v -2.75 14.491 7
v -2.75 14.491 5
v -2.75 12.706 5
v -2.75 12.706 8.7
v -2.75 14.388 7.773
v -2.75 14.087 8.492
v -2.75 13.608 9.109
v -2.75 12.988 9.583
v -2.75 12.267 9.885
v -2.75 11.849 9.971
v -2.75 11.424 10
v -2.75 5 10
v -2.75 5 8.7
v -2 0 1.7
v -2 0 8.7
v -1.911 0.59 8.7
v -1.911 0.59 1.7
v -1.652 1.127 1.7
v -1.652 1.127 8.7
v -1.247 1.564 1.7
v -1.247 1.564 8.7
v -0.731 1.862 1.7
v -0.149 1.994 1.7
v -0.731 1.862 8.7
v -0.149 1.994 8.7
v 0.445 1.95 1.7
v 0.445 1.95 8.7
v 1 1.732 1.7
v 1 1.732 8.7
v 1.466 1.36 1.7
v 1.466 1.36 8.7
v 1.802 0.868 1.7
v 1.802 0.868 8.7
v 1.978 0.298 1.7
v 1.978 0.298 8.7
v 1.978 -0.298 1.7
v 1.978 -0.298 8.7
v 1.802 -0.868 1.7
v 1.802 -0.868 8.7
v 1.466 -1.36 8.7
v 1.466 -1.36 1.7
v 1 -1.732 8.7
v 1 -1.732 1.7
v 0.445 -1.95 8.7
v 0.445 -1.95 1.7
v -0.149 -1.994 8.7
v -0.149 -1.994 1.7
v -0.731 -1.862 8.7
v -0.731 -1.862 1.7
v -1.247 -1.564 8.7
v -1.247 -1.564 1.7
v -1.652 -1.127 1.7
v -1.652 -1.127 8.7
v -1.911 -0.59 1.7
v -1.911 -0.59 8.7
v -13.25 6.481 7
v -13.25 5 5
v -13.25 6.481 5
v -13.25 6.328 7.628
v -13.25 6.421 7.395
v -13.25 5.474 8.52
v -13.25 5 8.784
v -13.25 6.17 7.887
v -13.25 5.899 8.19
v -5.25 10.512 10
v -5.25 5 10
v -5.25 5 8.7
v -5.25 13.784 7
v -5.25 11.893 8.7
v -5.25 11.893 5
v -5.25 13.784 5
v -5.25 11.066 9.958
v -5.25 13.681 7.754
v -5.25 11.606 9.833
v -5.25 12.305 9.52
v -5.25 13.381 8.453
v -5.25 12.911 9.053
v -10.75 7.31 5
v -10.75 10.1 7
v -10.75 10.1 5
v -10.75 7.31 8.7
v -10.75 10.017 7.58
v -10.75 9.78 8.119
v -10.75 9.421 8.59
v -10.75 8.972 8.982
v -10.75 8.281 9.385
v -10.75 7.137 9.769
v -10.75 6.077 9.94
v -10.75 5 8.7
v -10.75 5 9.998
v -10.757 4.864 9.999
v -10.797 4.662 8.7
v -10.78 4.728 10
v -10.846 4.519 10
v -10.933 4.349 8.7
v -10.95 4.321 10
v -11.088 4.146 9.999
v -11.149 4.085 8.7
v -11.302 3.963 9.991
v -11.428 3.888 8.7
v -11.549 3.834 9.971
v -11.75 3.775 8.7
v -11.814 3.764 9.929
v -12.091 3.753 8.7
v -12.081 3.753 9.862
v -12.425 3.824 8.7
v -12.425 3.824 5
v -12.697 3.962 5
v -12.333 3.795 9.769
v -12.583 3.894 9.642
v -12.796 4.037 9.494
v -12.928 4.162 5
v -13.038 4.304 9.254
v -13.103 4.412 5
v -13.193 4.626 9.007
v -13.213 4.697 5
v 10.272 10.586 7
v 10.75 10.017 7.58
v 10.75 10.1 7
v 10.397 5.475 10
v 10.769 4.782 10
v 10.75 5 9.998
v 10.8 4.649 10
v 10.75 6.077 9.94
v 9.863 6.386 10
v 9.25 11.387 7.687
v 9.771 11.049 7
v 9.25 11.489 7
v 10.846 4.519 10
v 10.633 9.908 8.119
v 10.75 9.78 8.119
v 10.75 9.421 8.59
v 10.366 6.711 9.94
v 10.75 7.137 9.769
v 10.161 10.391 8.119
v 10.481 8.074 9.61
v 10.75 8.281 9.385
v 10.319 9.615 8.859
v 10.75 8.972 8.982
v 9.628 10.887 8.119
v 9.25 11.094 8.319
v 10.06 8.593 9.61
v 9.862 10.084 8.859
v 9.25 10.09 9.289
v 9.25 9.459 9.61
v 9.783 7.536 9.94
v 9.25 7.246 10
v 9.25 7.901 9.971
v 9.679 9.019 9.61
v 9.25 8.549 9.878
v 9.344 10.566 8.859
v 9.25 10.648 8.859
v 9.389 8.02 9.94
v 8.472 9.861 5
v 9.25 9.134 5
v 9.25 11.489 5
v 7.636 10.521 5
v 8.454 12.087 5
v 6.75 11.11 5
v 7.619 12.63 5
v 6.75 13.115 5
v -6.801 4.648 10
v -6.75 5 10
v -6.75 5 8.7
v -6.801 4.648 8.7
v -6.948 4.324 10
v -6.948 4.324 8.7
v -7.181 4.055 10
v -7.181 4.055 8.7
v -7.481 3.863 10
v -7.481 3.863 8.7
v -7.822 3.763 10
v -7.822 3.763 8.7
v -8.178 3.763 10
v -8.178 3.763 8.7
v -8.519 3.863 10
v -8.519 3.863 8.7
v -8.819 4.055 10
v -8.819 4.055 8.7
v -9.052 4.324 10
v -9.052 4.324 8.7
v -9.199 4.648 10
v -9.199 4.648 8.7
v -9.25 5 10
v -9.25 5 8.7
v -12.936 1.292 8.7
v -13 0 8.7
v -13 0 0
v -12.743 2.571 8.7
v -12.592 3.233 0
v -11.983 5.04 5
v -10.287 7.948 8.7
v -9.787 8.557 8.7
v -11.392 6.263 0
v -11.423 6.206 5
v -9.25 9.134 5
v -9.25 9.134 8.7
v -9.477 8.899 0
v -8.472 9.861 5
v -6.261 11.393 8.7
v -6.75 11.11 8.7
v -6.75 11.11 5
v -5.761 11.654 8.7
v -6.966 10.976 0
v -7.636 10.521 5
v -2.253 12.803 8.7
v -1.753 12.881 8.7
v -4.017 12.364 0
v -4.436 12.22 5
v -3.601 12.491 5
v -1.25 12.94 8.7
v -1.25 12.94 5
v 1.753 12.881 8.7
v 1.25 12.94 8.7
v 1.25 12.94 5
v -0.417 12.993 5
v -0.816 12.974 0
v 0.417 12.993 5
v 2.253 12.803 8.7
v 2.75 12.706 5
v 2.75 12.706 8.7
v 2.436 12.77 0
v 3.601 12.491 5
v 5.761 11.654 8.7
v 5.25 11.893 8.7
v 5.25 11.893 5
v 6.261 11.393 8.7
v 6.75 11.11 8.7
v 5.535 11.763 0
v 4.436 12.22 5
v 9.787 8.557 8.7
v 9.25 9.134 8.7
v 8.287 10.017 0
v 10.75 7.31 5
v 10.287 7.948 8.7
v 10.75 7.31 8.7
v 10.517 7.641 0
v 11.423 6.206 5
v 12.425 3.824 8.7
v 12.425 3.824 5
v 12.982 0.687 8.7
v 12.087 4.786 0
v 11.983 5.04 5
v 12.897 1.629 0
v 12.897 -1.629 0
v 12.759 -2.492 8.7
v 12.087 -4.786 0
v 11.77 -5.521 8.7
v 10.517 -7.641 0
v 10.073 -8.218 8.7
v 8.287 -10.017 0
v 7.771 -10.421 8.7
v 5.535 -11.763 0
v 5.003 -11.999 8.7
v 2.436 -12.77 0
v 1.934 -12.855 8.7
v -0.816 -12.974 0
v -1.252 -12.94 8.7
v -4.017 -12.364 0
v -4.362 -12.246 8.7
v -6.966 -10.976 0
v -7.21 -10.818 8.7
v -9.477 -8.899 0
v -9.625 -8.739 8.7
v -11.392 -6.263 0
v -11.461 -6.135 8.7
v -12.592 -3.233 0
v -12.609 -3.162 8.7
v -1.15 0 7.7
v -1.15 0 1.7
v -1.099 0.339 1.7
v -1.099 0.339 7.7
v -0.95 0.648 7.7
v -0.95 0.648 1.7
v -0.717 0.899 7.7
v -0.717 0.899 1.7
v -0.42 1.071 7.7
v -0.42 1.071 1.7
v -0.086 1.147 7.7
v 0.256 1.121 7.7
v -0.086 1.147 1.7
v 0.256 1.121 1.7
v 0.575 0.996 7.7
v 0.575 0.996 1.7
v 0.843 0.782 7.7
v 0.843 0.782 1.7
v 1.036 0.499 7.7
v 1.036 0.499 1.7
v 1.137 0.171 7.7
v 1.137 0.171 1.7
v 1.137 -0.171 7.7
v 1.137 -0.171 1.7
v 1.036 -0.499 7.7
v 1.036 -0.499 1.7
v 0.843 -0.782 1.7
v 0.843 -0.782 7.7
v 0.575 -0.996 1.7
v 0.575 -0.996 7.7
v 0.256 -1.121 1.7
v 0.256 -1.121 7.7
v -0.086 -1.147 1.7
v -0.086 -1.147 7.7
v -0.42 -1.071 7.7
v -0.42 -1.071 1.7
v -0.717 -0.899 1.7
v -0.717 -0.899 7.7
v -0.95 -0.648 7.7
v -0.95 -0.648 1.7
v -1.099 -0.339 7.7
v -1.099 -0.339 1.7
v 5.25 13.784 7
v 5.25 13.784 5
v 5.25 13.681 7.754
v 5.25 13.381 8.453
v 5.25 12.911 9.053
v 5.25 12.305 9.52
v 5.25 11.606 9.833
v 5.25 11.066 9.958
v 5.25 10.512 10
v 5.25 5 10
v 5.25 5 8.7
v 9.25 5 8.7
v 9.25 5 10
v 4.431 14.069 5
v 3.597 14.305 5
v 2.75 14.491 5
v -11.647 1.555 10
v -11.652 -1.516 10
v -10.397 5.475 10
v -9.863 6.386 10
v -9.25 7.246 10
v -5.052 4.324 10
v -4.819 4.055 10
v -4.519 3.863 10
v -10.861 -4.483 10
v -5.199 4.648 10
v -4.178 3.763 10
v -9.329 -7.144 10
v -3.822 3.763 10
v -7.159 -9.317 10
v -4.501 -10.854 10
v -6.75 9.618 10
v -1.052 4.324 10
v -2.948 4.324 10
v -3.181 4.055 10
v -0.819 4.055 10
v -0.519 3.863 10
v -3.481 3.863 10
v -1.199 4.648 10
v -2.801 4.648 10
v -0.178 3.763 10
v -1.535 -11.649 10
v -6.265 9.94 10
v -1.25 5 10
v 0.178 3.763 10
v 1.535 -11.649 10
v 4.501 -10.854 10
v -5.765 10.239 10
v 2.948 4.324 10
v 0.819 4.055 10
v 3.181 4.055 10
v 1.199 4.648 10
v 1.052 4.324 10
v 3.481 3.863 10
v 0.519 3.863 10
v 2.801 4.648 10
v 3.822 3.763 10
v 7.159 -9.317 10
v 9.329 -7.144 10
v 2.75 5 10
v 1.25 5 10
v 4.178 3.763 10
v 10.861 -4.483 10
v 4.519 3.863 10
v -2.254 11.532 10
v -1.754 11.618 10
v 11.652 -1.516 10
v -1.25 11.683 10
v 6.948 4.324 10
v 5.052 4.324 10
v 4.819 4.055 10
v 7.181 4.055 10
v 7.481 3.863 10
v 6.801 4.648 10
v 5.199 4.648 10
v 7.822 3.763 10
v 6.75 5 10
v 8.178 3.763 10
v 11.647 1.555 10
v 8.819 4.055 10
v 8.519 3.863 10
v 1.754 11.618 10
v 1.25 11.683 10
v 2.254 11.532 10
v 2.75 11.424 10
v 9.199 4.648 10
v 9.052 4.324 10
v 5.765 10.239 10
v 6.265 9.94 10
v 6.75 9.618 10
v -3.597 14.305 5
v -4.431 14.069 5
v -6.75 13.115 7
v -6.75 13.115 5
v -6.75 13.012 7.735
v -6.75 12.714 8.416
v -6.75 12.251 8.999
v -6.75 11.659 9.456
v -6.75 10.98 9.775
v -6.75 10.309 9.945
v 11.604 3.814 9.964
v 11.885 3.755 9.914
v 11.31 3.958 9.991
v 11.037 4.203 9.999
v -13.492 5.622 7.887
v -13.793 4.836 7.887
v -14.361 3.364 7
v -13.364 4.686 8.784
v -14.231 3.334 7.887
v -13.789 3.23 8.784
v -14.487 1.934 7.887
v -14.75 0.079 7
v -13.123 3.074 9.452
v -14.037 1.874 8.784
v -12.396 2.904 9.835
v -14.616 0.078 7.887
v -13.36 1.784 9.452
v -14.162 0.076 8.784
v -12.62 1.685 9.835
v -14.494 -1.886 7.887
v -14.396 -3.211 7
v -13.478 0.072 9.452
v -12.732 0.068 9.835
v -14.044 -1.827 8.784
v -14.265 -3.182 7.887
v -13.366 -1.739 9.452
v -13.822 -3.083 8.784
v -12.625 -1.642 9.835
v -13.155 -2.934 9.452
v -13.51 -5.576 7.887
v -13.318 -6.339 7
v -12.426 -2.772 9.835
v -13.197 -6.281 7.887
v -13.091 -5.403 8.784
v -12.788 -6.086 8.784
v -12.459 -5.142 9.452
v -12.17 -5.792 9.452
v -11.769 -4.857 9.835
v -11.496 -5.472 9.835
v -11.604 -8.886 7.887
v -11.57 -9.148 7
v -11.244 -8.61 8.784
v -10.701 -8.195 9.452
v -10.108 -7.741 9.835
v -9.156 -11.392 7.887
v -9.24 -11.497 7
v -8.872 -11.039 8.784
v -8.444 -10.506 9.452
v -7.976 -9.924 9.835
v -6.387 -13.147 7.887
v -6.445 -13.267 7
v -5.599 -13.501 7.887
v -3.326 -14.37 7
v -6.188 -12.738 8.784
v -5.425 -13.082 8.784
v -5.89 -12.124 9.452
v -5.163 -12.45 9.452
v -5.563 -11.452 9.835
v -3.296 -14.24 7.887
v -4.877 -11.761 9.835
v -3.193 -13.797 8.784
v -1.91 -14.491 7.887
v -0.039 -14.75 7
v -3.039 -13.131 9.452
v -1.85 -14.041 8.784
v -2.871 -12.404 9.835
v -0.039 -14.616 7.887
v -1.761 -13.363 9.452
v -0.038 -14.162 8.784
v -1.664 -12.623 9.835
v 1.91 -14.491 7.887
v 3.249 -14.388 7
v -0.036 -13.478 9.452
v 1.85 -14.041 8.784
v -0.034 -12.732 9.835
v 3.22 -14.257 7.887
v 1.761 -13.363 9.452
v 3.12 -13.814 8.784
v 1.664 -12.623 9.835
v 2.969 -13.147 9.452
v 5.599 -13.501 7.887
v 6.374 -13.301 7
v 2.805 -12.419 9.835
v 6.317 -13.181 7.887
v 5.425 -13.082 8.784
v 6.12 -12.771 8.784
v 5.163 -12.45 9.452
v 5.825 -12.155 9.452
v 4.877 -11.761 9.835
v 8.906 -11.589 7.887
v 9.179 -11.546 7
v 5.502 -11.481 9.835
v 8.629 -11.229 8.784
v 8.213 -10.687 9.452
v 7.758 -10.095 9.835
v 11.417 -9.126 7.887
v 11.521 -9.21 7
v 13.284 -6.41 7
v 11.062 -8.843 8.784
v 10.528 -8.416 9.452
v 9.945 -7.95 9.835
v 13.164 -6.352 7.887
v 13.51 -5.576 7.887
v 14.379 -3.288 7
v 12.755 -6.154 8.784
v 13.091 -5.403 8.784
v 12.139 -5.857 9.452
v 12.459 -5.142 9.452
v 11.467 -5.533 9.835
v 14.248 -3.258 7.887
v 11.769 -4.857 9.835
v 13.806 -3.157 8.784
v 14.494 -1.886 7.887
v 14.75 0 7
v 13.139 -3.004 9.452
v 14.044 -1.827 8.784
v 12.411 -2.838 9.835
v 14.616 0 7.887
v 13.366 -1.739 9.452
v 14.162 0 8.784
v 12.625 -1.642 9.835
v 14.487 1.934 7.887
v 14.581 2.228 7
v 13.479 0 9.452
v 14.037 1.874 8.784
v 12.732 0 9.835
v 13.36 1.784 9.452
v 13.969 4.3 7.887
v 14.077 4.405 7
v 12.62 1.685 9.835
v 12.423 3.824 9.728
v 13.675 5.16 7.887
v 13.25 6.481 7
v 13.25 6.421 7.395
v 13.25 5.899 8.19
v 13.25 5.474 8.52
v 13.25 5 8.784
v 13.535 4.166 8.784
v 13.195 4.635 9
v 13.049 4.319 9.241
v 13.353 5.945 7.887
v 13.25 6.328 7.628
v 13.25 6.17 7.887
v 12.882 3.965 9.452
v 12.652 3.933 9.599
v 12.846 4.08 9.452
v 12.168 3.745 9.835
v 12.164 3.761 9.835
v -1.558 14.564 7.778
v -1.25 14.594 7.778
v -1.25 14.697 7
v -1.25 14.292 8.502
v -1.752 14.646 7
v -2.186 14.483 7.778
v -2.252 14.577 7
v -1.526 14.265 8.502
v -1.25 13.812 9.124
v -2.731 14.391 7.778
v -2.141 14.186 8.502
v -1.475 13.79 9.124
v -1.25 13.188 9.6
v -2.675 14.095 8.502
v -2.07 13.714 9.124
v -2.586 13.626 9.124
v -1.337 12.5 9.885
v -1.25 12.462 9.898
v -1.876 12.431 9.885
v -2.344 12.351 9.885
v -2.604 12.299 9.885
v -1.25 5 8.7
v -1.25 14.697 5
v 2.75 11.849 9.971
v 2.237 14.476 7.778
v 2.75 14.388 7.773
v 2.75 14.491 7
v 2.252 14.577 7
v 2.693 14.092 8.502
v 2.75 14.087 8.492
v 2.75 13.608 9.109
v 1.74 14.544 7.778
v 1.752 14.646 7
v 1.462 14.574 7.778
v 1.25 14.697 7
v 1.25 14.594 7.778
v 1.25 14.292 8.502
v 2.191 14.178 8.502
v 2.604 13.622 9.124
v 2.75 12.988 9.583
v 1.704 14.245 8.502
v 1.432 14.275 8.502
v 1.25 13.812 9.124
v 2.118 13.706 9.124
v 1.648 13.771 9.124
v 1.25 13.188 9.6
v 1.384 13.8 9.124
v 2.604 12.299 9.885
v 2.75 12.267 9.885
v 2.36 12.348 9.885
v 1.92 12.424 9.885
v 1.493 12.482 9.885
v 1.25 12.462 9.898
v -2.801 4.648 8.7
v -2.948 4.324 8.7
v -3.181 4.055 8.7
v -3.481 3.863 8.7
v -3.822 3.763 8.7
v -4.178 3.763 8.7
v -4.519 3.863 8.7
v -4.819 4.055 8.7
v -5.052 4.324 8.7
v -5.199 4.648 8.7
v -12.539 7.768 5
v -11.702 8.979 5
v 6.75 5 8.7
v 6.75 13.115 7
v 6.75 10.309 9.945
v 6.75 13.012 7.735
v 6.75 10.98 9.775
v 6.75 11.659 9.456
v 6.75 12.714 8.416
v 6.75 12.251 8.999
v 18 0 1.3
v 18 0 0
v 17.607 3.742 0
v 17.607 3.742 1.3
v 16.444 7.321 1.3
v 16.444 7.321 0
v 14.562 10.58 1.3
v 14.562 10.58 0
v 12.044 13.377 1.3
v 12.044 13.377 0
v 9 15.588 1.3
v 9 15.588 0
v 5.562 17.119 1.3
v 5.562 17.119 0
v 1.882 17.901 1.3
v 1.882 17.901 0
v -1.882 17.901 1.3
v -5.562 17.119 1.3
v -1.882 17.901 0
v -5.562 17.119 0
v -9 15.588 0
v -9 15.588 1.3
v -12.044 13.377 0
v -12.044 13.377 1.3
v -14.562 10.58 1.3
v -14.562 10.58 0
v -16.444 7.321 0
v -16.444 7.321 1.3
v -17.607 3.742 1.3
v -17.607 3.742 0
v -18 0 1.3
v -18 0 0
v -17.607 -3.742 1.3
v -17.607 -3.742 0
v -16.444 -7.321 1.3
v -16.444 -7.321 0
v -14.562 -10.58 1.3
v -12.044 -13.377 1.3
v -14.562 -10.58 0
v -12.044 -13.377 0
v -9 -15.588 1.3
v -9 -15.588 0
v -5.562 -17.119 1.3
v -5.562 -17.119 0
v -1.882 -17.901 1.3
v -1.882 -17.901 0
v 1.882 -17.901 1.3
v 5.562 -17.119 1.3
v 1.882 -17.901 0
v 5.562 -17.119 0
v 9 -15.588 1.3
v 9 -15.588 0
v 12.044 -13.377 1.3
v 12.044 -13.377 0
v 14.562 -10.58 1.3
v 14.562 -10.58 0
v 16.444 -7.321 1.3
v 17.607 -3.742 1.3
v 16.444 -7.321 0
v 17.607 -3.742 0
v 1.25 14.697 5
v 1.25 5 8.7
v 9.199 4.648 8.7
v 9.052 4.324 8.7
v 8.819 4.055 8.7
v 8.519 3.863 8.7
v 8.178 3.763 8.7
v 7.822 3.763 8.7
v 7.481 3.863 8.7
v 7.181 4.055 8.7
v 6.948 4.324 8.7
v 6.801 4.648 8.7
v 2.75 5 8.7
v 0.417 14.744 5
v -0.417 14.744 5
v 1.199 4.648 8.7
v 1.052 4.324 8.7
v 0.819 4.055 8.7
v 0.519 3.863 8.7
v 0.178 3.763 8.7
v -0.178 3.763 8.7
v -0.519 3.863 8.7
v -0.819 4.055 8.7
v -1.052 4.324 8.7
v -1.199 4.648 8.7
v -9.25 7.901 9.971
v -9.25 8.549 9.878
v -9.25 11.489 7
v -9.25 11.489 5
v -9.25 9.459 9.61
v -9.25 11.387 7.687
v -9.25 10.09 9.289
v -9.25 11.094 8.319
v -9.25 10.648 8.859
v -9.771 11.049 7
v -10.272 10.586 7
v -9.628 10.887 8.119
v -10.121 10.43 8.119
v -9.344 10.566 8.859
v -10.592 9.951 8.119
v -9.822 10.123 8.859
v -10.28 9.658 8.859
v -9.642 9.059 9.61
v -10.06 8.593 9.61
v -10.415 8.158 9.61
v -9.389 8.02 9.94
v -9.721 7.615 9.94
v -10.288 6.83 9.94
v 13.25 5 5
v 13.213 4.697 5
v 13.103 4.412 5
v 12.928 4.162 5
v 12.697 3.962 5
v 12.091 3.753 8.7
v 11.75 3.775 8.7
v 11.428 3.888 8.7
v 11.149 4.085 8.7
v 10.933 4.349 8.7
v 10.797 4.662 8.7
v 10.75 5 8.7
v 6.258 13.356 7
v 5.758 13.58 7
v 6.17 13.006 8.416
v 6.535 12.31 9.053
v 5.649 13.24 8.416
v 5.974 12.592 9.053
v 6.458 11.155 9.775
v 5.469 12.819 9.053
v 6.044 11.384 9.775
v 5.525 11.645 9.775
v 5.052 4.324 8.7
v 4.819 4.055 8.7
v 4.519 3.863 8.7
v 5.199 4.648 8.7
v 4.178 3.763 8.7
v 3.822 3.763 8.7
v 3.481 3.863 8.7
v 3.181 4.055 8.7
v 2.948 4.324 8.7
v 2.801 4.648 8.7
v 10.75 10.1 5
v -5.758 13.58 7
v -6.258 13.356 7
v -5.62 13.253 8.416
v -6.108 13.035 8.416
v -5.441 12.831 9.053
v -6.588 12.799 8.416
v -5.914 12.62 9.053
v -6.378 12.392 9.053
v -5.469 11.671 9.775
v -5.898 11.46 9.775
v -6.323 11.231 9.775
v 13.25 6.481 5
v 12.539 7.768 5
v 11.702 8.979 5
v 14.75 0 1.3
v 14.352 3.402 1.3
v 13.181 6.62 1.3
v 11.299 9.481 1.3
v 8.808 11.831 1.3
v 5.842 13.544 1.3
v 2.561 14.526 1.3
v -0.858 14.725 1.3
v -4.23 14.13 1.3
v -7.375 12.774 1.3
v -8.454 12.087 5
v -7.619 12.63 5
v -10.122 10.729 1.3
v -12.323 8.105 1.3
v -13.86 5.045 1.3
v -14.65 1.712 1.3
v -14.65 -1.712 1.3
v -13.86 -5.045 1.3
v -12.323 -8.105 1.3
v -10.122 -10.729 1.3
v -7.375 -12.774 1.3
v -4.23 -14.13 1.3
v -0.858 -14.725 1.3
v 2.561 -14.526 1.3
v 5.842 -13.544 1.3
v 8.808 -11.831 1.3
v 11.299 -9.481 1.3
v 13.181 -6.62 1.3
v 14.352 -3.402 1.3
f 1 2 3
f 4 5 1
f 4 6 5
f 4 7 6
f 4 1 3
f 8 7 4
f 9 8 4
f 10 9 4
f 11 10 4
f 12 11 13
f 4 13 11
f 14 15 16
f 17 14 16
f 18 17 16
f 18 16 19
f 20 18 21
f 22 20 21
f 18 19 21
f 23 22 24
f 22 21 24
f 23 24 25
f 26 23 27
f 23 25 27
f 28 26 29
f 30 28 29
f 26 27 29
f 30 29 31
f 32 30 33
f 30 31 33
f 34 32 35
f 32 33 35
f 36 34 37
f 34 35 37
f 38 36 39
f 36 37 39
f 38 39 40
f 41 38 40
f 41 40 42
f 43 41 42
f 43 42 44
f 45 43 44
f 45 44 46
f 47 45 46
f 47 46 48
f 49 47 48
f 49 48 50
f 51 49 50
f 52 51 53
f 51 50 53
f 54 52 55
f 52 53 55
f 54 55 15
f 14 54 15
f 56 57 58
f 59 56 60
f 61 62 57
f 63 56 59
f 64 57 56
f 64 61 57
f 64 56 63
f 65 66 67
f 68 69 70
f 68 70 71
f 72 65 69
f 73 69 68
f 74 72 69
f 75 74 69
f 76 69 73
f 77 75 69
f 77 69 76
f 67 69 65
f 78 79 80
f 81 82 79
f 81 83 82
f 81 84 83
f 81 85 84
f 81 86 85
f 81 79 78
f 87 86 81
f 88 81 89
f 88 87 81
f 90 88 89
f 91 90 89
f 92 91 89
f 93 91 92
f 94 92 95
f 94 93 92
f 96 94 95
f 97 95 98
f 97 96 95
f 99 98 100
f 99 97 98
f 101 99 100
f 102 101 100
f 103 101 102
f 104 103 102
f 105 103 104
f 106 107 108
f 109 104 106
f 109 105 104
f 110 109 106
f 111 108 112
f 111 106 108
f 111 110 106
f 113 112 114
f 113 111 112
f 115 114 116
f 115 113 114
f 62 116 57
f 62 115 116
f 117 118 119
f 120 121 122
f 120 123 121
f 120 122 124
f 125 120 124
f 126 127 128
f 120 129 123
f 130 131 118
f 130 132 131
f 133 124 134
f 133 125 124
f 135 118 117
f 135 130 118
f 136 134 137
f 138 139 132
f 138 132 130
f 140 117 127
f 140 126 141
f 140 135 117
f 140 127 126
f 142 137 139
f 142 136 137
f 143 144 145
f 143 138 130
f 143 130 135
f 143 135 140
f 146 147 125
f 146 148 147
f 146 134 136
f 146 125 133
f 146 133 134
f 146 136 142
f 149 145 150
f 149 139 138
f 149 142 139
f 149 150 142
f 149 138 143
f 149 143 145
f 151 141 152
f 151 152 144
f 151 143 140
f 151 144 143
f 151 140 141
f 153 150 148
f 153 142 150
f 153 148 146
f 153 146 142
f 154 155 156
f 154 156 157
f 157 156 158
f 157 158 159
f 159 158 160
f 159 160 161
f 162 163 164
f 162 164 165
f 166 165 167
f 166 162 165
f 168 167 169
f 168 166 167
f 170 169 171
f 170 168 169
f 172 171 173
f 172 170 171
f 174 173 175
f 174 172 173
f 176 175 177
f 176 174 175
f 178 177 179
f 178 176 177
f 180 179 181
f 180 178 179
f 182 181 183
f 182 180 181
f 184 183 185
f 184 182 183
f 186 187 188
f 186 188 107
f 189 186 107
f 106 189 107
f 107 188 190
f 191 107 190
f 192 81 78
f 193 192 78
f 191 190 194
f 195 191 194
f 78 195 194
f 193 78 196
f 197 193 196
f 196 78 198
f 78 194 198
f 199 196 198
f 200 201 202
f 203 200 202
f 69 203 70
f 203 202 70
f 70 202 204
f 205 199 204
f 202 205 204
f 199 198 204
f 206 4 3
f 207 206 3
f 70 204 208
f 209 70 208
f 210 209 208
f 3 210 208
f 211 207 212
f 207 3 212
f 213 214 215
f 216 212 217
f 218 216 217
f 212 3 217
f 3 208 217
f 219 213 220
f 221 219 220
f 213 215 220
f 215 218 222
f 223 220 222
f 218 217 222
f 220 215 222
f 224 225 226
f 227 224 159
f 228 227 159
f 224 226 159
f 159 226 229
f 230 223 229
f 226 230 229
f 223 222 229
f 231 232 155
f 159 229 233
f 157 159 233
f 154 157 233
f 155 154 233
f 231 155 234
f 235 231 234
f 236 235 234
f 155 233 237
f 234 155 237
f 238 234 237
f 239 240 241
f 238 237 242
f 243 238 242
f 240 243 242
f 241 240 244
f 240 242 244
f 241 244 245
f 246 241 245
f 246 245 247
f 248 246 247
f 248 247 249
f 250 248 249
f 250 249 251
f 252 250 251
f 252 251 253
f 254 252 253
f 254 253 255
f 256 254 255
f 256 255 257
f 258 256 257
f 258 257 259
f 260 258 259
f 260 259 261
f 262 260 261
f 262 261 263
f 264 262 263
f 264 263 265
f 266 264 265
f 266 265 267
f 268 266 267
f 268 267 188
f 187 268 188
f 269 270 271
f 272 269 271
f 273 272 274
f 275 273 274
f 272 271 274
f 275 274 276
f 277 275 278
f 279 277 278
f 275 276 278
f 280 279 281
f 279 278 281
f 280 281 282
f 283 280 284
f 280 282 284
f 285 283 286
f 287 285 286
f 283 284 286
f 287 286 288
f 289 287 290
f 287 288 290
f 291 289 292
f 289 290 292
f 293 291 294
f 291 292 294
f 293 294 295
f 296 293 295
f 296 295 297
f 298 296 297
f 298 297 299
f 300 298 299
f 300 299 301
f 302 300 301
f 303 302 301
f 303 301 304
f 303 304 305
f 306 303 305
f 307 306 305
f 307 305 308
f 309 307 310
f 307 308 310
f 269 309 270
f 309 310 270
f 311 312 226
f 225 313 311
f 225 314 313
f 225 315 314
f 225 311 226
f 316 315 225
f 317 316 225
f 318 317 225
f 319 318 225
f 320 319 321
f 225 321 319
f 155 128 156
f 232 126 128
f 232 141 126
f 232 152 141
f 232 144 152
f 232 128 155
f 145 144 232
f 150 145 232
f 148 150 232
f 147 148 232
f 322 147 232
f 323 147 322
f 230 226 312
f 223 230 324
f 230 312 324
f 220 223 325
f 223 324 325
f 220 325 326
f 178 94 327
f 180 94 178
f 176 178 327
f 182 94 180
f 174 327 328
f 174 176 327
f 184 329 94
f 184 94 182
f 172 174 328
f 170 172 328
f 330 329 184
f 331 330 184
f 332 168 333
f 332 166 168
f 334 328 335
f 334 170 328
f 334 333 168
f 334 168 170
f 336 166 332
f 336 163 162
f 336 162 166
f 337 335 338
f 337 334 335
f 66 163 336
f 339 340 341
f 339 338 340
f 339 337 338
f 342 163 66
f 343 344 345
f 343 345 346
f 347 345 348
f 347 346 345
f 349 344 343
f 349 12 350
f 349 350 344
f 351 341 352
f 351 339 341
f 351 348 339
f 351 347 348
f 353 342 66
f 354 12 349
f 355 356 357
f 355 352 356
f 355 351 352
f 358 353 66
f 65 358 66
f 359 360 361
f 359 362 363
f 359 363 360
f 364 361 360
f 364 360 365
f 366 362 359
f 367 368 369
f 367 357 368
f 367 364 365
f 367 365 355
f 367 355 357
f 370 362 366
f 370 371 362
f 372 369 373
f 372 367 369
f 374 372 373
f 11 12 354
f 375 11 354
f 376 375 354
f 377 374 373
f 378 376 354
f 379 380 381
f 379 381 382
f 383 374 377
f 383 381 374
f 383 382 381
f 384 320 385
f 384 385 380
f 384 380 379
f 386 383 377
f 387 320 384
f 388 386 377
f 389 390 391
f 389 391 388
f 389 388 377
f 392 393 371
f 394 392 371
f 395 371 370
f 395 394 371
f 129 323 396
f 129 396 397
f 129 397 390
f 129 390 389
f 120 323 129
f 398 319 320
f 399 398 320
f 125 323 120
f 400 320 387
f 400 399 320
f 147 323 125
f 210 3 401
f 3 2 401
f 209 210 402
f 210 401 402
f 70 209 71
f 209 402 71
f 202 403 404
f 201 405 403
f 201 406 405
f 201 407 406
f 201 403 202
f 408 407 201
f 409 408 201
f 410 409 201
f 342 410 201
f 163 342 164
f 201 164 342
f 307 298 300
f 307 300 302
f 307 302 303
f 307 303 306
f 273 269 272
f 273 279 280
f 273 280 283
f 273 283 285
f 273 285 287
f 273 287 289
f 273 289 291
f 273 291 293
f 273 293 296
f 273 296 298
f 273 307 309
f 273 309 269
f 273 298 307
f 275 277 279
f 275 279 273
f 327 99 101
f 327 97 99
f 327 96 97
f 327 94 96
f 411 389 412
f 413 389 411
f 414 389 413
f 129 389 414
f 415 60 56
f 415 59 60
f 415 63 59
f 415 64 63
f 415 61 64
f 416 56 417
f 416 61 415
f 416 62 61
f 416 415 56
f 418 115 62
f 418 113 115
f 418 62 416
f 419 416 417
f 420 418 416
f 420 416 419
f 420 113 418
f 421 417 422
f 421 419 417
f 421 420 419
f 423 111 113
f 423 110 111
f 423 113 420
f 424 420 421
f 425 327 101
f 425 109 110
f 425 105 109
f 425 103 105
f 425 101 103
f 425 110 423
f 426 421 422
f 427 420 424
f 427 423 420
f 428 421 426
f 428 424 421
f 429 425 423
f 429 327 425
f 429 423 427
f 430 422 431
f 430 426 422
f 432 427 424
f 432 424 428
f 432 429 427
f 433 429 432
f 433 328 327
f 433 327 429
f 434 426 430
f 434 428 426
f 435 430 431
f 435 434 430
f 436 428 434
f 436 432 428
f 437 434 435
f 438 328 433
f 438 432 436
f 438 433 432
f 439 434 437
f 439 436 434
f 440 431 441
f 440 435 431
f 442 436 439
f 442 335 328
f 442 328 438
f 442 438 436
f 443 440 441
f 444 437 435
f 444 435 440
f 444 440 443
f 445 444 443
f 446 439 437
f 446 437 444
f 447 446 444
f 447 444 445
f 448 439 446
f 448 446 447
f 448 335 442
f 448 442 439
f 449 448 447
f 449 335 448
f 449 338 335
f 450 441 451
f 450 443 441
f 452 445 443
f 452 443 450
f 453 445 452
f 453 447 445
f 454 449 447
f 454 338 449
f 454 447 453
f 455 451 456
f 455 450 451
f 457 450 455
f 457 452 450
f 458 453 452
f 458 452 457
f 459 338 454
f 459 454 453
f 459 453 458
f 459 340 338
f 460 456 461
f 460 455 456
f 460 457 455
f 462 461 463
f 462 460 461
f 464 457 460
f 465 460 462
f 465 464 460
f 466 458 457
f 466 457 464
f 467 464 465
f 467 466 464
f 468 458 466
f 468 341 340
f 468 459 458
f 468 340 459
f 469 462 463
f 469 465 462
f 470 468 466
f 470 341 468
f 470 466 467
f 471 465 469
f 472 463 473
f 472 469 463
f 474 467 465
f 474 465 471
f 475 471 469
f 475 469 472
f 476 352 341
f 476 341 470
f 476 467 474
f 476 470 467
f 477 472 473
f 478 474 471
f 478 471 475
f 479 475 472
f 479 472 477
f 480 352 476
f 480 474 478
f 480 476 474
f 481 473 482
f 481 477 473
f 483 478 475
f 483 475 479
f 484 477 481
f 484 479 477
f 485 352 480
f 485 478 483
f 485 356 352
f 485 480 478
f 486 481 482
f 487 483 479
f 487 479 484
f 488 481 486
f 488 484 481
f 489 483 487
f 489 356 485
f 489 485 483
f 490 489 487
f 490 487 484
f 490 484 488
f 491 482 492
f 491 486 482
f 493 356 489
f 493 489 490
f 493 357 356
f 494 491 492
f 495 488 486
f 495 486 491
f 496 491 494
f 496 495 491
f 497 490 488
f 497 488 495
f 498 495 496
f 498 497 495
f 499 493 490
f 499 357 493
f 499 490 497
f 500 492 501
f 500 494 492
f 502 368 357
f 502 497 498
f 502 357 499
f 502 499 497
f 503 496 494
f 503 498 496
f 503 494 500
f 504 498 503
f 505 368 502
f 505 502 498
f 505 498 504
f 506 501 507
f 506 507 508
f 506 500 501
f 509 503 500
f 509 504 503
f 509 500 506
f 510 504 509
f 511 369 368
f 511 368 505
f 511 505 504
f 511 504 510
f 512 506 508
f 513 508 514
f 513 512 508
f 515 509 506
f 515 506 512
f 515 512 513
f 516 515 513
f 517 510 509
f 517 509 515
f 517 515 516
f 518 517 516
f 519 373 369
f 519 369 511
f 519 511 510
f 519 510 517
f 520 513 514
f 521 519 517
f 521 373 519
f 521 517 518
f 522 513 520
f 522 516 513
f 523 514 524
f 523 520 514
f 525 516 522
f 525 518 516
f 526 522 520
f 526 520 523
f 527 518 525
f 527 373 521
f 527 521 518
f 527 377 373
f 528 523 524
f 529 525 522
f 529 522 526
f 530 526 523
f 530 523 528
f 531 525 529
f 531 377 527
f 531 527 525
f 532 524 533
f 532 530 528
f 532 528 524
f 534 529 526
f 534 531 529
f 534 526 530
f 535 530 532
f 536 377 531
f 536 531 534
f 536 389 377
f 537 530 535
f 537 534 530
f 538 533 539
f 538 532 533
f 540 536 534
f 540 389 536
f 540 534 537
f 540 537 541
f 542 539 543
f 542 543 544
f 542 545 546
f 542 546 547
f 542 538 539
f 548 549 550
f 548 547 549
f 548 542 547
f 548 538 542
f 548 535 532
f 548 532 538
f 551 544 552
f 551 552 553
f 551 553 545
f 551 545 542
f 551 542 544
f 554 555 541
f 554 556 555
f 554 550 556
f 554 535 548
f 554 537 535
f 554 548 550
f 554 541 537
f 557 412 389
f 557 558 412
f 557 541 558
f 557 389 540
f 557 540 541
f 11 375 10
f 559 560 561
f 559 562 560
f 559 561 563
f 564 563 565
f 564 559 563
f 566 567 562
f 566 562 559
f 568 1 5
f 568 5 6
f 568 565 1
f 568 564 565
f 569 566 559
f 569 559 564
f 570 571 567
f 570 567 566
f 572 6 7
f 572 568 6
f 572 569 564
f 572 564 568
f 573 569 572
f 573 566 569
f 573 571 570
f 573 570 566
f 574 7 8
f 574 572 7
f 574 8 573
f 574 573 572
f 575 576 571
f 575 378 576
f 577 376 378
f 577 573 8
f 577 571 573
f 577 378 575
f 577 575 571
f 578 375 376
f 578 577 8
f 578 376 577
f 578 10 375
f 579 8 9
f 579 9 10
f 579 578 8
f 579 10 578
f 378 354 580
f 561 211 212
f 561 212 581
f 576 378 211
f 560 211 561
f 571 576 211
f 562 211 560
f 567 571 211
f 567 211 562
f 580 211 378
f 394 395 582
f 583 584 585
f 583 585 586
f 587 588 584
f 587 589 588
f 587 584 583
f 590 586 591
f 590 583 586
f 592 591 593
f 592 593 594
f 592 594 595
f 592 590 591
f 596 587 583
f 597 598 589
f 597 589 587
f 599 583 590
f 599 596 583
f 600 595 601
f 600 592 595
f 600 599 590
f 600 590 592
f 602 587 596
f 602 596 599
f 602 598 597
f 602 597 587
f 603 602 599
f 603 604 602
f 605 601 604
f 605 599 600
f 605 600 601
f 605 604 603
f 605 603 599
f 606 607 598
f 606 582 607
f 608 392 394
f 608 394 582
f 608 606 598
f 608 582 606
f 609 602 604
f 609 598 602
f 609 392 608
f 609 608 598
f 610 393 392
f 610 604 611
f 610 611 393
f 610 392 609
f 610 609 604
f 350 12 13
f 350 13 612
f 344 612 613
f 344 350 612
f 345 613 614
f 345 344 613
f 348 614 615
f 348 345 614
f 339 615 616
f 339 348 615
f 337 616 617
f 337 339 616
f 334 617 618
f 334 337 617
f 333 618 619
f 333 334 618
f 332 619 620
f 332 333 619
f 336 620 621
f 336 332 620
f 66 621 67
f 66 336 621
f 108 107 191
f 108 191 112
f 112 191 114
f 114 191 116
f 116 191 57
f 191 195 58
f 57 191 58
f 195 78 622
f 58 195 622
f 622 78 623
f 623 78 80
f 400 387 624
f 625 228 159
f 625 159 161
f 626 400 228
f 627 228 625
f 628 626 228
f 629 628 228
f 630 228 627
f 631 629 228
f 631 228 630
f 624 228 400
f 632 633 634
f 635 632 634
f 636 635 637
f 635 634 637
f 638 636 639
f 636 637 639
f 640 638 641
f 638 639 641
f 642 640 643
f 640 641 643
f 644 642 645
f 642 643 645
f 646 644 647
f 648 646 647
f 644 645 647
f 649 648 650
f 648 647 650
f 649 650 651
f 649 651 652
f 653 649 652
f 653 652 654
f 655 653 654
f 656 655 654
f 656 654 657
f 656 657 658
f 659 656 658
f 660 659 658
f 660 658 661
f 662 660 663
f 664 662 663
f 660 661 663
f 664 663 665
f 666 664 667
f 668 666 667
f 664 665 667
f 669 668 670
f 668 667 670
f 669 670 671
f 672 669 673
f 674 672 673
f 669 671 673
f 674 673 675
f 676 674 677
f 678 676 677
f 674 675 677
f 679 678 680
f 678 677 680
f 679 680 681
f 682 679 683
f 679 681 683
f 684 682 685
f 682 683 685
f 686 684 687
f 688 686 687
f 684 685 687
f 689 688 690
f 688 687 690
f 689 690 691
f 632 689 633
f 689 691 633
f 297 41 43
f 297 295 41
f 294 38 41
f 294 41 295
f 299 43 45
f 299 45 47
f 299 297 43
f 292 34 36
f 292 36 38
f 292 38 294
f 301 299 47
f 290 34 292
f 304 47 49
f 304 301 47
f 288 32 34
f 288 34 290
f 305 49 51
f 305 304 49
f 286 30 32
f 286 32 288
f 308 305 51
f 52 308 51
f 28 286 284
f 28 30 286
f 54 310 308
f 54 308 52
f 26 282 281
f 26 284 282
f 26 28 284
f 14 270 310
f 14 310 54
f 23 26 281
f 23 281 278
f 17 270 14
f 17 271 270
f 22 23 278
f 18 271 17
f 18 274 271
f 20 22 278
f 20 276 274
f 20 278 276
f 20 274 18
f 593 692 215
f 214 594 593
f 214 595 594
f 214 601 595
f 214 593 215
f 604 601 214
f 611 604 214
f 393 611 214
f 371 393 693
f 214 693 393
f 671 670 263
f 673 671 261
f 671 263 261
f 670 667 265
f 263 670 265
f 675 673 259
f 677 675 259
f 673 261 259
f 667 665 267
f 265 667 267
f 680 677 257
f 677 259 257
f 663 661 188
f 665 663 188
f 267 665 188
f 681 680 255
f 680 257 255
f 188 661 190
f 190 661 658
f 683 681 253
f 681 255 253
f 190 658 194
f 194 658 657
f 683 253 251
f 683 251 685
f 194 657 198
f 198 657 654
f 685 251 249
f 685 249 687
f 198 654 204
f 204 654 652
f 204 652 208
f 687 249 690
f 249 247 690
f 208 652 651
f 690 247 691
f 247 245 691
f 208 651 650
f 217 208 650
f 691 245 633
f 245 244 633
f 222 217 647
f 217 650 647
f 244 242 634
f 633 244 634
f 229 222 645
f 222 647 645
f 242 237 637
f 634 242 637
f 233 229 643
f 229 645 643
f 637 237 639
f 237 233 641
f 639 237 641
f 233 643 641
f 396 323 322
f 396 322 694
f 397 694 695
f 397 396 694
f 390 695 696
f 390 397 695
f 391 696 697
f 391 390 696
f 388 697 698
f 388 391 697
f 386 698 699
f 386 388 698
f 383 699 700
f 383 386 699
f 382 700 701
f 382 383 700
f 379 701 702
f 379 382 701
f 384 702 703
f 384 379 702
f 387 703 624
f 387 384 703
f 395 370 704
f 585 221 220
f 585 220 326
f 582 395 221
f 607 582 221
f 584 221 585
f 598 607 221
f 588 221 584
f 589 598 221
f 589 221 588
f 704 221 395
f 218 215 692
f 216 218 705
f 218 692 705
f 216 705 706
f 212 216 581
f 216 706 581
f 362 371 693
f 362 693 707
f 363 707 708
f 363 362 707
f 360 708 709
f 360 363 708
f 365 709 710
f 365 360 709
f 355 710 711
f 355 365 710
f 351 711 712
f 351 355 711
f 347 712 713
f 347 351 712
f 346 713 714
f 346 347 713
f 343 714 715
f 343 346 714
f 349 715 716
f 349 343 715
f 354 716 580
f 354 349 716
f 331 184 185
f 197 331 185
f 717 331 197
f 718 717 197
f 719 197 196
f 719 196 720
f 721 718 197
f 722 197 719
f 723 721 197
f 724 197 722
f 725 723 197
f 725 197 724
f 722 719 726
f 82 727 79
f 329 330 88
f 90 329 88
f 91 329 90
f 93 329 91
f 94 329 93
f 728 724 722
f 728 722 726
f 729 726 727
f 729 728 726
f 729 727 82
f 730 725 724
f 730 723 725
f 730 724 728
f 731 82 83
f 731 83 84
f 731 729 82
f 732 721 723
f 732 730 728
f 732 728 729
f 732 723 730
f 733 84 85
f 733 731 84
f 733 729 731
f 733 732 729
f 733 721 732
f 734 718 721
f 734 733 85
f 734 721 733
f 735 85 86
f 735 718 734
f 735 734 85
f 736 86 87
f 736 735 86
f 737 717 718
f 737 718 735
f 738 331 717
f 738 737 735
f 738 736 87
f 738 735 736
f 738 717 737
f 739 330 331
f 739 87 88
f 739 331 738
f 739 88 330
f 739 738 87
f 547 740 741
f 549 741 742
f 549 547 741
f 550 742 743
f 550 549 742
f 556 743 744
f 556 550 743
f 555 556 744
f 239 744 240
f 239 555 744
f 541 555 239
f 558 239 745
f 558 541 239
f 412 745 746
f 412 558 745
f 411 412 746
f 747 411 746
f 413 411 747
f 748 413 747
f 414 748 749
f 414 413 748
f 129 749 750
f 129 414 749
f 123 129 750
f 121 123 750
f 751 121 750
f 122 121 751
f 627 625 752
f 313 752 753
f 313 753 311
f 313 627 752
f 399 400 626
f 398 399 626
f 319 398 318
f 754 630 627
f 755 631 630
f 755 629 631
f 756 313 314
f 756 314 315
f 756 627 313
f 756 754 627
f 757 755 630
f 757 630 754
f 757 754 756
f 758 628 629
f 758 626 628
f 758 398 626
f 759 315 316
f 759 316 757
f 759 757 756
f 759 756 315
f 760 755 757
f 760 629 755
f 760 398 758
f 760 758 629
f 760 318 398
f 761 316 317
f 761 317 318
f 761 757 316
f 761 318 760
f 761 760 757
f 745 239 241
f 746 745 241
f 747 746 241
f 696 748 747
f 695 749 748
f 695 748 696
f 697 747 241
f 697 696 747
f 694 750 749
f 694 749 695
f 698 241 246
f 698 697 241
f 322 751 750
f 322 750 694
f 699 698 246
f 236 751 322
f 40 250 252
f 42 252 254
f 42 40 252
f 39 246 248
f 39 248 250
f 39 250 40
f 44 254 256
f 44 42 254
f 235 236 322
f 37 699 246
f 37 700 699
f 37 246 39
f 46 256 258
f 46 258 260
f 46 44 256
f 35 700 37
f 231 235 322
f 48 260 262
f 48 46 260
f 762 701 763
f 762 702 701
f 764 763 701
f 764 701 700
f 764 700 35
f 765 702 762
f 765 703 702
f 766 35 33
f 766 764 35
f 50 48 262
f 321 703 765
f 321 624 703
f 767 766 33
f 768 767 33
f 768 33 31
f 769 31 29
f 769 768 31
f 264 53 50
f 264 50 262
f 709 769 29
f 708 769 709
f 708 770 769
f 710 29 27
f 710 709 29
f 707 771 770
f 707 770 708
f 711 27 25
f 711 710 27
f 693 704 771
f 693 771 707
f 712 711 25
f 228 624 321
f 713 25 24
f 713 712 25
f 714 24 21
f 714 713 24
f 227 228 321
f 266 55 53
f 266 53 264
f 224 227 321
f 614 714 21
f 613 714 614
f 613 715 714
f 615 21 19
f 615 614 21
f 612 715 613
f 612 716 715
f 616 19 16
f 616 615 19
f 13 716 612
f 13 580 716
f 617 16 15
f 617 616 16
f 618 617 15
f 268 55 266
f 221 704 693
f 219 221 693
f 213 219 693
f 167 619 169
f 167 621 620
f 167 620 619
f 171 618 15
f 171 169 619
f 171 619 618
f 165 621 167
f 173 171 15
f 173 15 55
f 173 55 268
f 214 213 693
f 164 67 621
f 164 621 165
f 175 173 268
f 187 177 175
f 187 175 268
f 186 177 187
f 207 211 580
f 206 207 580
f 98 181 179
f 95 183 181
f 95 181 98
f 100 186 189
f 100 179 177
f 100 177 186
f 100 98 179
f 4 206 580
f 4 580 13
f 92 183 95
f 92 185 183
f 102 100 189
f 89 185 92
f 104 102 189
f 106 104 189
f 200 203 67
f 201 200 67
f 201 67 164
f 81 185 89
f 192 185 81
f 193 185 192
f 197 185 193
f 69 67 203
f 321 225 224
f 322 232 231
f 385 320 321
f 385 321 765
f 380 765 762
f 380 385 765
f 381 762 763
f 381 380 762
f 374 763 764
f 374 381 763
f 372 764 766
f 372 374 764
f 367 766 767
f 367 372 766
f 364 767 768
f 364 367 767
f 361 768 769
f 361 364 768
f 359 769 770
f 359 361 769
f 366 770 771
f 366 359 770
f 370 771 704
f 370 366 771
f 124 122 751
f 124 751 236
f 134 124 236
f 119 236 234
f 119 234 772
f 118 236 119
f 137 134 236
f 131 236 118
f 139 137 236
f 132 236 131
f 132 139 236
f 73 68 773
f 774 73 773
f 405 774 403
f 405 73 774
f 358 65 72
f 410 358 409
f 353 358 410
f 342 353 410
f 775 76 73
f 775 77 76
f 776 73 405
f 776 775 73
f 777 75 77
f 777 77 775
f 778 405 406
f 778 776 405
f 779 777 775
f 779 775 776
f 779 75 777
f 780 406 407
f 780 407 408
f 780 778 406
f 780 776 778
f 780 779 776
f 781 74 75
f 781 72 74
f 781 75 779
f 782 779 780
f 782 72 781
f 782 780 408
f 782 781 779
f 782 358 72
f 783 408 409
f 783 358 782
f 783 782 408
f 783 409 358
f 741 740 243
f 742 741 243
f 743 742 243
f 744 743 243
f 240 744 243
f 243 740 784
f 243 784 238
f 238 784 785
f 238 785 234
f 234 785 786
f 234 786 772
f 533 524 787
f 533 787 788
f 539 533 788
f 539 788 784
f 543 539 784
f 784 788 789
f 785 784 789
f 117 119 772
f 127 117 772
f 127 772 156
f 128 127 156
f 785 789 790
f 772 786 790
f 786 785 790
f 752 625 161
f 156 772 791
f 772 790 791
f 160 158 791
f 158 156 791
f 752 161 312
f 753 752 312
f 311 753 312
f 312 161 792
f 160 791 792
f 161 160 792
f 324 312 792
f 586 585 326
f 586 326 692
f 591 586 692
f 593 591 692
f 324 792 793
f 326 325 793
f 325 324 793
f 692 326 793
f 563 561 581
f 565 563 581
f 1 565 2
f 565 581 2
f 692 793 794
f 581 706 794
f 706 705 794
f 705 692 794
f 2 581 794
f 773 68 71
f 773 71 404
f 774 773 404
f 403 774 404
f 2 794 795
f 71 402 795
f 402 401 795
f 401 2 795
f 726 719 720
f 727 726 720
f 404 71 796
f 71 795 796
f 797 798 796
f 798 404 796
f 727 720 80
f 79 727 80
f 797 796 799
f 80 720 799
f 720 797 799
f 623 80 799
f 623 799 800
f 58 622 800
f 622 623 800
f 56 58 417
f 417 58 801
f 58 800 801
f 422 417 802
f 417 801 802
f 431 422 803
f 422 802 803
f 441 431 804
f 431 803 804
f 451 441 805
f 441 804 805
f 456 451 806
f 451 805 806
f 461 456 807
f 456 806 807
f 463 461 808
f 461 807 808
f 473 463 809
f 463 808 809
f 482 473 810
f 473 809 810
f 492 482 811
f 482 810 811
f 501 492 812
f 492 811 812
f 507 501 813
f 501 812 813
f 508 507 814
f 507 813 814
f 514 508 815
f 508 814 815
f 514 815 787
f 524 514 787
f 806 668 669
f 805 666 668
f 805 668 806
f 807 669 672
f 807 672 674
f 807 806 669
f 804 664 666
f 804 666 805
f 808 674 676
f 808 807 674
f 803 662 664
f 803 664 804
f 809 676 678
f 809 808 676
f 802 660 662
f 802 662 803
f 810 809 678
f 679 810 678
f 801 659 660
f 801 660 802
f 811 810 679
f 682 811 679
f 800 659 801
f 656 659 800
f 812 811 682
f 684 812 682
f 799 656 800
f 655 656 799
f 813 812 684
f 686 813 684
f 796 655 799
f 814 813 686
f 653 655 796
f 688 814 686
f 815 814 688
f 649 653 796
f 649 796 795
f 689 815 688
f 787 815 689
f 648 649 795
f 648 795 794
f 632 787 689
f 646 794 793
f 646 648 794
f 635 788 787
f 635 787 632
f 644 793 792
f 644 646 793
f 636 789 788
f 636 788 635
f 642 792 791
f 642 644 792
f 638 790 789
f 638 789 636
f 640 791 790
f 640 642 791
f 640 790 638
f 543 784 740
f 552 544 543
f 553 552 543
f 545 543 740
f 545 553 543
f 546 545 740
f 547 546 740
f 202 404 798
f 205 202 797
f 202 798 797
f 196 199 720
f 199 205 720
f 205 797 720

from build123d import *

# Parameters (mm, degrees)
SKETCH1_R           = 18
BOSS_EXTRUDE1_DEPTH = 1.3
SKETCH2_R           = 14.75
BOSS_EXTRUDE2_DEPTH = 8.7
FILLET1_R           = 3
SKETCH3_R           = 13
CUT_EXTRUDE1_DEPTH  = 8.7
SKETCH4_R           = 2
BOSS_EXTRUDE3_DEPTH = 7
SKETCH5_R           = 1.15
CUT_EXTRUDE2_DEPTH  = 6
CUT_EXTRUDE3_DEPTH  = 5


with BuildPart() as part:
    # Sketch1 → Boss-Extrude1 (new body)
    with BuildSketch(Plane.XY):
        Circle(SKETCH1_R)
    extrude(amount=BOSS_EXTRUDE1_DEPTH)

    # Sketch2 → Boss-Extrude2 (add)
    with BuildSketch(Plane.XY.offset(1.3)):
        Circle(SKETCH2_R)
    extrude(amount=BOSS_EXTRUDE2_DEPTH)

    # Fillet1
    fillet1_edges = [part.edges().sort_by_distance(p)[0] for p in [
        (-14.75, 0, 10),
    ]]
    fillet(fillet1_edges, radius=FILLET1_R)

    # Sketch3 → Cut-Extrude1 (cut)
    with BuildSketch(Plane(origin=(0, 0, 0), x_dir=(-1, 0, 0), z_dir=(0, 0, -1))):
        Circle(SKETCH3_R)
    extrude(amount=-CUT_EXTRUDE1_DEPTH, mode=Mode.SUBTRACT)

    # Sketch4 → Boss-Extrude3 (add)
    with BuildSketch(Plane(origin=(0, 0, 8.7), x_dir=(-1, 0, 0), z_dir=(0, 0, -1))):
        Circle(SKETCH4_R)
    extrude(amount=BOSS_EXTRUDE3_DEPTH)

    # Sketch5 → Cut-Extrude2 (cut)
    with BuildSketch(Plane(origin=(0, 0, 1.7), x_dir=(-1, 0, 0), z_dir=(0, 0, -1))):
        Circle(SKETCH5_R)
    extrude(amount=-CUT_EXTRUDE2_DEPTH, mode=Mode.SUBTRACT)

    # Sketch8 → Cut-Extrude3 (cut)
    with BuildSketch(Plane.XY.offset(10)):
        with BuildLine():
            Line((-1.25, 5), (-1.25, 20))
            ThreePointArc((-1.25, 20), (0, 21.25), (1.25, 20))
            Line((1.25, 20), (1.25, 5))
            ThreePointArc((1.25, 5), (0, 3.75), (-1.25, 5))
        make_face()
        with BuildLine():
            Line((2.75, 5), (2.75, 20))
            ThreePointArc((2.75, 20), (4, 21.25), (5.25, 20))
            Line((5.25, 20), (5.25, 5))
            ThreePointArc((5.25, 5), (4, 3.75), (2.75, 5))
        make_face()
        with BuildLine():
            Line((6.75, 5), (6.75, 20))
            ThreePointArc((6.75, 20), (8, 21.25), (9.25, 20))
            Line((9.25, 20), (9.25, 5))
            ThreePointArc((9.25, 5), (8, 3.75), (6.75, 5))
        make_face()
        with BuildLine():
            Line((10.75, 5), (10.75, 20))
            ThreePointArc((10.75, 20), (12, 21.25), (13.25, 20))
            Line((13.25, 20), (13.25, 5))
            ThreePointArc((13.25, 5), (12, 3.75), (10.75, 5))
        make_face()
        with BuildLine():
            Line((-5.25, 5), (-5.25, 20))
            ThreePointArc((-5.25, 20), (-4, 21.25), (-2.75, 20))
            Line((-2.75, 20), (-2.75, 5))
            ThreePointArc((-2.75, 5), (-4, 3.75), (-5.25, 5))
        make_face()
        with BuildLine():
            Line((-9.25, 5), (-9.25, 20))
            ThreePointArc((-9.25, 20), (-8, 21.25), (-6.75, 20))
            Line((-6.75, 20), (-6.75, 5))
            ThreePointArc((-6.75, 5), (-8, 3.75), (-9.25, 5))
        make_face()
        with BuildLine():
            Line((-13.25, 5), (-13.25, 20))
            ThreePointArc((-13.25, 20), (-12, 21.25), (-10.75, 20))
            Line((-10.75, 20), (-10.75, 5))
            ThreePointArc((-10.75, 5), (-12, 3.75), (-13.25, 5))
        make_face()
    extrude(amount=-CUT_EXTRUDE3_DEPTH, mode=Mode.SUBTRACT)


solid = part.part
